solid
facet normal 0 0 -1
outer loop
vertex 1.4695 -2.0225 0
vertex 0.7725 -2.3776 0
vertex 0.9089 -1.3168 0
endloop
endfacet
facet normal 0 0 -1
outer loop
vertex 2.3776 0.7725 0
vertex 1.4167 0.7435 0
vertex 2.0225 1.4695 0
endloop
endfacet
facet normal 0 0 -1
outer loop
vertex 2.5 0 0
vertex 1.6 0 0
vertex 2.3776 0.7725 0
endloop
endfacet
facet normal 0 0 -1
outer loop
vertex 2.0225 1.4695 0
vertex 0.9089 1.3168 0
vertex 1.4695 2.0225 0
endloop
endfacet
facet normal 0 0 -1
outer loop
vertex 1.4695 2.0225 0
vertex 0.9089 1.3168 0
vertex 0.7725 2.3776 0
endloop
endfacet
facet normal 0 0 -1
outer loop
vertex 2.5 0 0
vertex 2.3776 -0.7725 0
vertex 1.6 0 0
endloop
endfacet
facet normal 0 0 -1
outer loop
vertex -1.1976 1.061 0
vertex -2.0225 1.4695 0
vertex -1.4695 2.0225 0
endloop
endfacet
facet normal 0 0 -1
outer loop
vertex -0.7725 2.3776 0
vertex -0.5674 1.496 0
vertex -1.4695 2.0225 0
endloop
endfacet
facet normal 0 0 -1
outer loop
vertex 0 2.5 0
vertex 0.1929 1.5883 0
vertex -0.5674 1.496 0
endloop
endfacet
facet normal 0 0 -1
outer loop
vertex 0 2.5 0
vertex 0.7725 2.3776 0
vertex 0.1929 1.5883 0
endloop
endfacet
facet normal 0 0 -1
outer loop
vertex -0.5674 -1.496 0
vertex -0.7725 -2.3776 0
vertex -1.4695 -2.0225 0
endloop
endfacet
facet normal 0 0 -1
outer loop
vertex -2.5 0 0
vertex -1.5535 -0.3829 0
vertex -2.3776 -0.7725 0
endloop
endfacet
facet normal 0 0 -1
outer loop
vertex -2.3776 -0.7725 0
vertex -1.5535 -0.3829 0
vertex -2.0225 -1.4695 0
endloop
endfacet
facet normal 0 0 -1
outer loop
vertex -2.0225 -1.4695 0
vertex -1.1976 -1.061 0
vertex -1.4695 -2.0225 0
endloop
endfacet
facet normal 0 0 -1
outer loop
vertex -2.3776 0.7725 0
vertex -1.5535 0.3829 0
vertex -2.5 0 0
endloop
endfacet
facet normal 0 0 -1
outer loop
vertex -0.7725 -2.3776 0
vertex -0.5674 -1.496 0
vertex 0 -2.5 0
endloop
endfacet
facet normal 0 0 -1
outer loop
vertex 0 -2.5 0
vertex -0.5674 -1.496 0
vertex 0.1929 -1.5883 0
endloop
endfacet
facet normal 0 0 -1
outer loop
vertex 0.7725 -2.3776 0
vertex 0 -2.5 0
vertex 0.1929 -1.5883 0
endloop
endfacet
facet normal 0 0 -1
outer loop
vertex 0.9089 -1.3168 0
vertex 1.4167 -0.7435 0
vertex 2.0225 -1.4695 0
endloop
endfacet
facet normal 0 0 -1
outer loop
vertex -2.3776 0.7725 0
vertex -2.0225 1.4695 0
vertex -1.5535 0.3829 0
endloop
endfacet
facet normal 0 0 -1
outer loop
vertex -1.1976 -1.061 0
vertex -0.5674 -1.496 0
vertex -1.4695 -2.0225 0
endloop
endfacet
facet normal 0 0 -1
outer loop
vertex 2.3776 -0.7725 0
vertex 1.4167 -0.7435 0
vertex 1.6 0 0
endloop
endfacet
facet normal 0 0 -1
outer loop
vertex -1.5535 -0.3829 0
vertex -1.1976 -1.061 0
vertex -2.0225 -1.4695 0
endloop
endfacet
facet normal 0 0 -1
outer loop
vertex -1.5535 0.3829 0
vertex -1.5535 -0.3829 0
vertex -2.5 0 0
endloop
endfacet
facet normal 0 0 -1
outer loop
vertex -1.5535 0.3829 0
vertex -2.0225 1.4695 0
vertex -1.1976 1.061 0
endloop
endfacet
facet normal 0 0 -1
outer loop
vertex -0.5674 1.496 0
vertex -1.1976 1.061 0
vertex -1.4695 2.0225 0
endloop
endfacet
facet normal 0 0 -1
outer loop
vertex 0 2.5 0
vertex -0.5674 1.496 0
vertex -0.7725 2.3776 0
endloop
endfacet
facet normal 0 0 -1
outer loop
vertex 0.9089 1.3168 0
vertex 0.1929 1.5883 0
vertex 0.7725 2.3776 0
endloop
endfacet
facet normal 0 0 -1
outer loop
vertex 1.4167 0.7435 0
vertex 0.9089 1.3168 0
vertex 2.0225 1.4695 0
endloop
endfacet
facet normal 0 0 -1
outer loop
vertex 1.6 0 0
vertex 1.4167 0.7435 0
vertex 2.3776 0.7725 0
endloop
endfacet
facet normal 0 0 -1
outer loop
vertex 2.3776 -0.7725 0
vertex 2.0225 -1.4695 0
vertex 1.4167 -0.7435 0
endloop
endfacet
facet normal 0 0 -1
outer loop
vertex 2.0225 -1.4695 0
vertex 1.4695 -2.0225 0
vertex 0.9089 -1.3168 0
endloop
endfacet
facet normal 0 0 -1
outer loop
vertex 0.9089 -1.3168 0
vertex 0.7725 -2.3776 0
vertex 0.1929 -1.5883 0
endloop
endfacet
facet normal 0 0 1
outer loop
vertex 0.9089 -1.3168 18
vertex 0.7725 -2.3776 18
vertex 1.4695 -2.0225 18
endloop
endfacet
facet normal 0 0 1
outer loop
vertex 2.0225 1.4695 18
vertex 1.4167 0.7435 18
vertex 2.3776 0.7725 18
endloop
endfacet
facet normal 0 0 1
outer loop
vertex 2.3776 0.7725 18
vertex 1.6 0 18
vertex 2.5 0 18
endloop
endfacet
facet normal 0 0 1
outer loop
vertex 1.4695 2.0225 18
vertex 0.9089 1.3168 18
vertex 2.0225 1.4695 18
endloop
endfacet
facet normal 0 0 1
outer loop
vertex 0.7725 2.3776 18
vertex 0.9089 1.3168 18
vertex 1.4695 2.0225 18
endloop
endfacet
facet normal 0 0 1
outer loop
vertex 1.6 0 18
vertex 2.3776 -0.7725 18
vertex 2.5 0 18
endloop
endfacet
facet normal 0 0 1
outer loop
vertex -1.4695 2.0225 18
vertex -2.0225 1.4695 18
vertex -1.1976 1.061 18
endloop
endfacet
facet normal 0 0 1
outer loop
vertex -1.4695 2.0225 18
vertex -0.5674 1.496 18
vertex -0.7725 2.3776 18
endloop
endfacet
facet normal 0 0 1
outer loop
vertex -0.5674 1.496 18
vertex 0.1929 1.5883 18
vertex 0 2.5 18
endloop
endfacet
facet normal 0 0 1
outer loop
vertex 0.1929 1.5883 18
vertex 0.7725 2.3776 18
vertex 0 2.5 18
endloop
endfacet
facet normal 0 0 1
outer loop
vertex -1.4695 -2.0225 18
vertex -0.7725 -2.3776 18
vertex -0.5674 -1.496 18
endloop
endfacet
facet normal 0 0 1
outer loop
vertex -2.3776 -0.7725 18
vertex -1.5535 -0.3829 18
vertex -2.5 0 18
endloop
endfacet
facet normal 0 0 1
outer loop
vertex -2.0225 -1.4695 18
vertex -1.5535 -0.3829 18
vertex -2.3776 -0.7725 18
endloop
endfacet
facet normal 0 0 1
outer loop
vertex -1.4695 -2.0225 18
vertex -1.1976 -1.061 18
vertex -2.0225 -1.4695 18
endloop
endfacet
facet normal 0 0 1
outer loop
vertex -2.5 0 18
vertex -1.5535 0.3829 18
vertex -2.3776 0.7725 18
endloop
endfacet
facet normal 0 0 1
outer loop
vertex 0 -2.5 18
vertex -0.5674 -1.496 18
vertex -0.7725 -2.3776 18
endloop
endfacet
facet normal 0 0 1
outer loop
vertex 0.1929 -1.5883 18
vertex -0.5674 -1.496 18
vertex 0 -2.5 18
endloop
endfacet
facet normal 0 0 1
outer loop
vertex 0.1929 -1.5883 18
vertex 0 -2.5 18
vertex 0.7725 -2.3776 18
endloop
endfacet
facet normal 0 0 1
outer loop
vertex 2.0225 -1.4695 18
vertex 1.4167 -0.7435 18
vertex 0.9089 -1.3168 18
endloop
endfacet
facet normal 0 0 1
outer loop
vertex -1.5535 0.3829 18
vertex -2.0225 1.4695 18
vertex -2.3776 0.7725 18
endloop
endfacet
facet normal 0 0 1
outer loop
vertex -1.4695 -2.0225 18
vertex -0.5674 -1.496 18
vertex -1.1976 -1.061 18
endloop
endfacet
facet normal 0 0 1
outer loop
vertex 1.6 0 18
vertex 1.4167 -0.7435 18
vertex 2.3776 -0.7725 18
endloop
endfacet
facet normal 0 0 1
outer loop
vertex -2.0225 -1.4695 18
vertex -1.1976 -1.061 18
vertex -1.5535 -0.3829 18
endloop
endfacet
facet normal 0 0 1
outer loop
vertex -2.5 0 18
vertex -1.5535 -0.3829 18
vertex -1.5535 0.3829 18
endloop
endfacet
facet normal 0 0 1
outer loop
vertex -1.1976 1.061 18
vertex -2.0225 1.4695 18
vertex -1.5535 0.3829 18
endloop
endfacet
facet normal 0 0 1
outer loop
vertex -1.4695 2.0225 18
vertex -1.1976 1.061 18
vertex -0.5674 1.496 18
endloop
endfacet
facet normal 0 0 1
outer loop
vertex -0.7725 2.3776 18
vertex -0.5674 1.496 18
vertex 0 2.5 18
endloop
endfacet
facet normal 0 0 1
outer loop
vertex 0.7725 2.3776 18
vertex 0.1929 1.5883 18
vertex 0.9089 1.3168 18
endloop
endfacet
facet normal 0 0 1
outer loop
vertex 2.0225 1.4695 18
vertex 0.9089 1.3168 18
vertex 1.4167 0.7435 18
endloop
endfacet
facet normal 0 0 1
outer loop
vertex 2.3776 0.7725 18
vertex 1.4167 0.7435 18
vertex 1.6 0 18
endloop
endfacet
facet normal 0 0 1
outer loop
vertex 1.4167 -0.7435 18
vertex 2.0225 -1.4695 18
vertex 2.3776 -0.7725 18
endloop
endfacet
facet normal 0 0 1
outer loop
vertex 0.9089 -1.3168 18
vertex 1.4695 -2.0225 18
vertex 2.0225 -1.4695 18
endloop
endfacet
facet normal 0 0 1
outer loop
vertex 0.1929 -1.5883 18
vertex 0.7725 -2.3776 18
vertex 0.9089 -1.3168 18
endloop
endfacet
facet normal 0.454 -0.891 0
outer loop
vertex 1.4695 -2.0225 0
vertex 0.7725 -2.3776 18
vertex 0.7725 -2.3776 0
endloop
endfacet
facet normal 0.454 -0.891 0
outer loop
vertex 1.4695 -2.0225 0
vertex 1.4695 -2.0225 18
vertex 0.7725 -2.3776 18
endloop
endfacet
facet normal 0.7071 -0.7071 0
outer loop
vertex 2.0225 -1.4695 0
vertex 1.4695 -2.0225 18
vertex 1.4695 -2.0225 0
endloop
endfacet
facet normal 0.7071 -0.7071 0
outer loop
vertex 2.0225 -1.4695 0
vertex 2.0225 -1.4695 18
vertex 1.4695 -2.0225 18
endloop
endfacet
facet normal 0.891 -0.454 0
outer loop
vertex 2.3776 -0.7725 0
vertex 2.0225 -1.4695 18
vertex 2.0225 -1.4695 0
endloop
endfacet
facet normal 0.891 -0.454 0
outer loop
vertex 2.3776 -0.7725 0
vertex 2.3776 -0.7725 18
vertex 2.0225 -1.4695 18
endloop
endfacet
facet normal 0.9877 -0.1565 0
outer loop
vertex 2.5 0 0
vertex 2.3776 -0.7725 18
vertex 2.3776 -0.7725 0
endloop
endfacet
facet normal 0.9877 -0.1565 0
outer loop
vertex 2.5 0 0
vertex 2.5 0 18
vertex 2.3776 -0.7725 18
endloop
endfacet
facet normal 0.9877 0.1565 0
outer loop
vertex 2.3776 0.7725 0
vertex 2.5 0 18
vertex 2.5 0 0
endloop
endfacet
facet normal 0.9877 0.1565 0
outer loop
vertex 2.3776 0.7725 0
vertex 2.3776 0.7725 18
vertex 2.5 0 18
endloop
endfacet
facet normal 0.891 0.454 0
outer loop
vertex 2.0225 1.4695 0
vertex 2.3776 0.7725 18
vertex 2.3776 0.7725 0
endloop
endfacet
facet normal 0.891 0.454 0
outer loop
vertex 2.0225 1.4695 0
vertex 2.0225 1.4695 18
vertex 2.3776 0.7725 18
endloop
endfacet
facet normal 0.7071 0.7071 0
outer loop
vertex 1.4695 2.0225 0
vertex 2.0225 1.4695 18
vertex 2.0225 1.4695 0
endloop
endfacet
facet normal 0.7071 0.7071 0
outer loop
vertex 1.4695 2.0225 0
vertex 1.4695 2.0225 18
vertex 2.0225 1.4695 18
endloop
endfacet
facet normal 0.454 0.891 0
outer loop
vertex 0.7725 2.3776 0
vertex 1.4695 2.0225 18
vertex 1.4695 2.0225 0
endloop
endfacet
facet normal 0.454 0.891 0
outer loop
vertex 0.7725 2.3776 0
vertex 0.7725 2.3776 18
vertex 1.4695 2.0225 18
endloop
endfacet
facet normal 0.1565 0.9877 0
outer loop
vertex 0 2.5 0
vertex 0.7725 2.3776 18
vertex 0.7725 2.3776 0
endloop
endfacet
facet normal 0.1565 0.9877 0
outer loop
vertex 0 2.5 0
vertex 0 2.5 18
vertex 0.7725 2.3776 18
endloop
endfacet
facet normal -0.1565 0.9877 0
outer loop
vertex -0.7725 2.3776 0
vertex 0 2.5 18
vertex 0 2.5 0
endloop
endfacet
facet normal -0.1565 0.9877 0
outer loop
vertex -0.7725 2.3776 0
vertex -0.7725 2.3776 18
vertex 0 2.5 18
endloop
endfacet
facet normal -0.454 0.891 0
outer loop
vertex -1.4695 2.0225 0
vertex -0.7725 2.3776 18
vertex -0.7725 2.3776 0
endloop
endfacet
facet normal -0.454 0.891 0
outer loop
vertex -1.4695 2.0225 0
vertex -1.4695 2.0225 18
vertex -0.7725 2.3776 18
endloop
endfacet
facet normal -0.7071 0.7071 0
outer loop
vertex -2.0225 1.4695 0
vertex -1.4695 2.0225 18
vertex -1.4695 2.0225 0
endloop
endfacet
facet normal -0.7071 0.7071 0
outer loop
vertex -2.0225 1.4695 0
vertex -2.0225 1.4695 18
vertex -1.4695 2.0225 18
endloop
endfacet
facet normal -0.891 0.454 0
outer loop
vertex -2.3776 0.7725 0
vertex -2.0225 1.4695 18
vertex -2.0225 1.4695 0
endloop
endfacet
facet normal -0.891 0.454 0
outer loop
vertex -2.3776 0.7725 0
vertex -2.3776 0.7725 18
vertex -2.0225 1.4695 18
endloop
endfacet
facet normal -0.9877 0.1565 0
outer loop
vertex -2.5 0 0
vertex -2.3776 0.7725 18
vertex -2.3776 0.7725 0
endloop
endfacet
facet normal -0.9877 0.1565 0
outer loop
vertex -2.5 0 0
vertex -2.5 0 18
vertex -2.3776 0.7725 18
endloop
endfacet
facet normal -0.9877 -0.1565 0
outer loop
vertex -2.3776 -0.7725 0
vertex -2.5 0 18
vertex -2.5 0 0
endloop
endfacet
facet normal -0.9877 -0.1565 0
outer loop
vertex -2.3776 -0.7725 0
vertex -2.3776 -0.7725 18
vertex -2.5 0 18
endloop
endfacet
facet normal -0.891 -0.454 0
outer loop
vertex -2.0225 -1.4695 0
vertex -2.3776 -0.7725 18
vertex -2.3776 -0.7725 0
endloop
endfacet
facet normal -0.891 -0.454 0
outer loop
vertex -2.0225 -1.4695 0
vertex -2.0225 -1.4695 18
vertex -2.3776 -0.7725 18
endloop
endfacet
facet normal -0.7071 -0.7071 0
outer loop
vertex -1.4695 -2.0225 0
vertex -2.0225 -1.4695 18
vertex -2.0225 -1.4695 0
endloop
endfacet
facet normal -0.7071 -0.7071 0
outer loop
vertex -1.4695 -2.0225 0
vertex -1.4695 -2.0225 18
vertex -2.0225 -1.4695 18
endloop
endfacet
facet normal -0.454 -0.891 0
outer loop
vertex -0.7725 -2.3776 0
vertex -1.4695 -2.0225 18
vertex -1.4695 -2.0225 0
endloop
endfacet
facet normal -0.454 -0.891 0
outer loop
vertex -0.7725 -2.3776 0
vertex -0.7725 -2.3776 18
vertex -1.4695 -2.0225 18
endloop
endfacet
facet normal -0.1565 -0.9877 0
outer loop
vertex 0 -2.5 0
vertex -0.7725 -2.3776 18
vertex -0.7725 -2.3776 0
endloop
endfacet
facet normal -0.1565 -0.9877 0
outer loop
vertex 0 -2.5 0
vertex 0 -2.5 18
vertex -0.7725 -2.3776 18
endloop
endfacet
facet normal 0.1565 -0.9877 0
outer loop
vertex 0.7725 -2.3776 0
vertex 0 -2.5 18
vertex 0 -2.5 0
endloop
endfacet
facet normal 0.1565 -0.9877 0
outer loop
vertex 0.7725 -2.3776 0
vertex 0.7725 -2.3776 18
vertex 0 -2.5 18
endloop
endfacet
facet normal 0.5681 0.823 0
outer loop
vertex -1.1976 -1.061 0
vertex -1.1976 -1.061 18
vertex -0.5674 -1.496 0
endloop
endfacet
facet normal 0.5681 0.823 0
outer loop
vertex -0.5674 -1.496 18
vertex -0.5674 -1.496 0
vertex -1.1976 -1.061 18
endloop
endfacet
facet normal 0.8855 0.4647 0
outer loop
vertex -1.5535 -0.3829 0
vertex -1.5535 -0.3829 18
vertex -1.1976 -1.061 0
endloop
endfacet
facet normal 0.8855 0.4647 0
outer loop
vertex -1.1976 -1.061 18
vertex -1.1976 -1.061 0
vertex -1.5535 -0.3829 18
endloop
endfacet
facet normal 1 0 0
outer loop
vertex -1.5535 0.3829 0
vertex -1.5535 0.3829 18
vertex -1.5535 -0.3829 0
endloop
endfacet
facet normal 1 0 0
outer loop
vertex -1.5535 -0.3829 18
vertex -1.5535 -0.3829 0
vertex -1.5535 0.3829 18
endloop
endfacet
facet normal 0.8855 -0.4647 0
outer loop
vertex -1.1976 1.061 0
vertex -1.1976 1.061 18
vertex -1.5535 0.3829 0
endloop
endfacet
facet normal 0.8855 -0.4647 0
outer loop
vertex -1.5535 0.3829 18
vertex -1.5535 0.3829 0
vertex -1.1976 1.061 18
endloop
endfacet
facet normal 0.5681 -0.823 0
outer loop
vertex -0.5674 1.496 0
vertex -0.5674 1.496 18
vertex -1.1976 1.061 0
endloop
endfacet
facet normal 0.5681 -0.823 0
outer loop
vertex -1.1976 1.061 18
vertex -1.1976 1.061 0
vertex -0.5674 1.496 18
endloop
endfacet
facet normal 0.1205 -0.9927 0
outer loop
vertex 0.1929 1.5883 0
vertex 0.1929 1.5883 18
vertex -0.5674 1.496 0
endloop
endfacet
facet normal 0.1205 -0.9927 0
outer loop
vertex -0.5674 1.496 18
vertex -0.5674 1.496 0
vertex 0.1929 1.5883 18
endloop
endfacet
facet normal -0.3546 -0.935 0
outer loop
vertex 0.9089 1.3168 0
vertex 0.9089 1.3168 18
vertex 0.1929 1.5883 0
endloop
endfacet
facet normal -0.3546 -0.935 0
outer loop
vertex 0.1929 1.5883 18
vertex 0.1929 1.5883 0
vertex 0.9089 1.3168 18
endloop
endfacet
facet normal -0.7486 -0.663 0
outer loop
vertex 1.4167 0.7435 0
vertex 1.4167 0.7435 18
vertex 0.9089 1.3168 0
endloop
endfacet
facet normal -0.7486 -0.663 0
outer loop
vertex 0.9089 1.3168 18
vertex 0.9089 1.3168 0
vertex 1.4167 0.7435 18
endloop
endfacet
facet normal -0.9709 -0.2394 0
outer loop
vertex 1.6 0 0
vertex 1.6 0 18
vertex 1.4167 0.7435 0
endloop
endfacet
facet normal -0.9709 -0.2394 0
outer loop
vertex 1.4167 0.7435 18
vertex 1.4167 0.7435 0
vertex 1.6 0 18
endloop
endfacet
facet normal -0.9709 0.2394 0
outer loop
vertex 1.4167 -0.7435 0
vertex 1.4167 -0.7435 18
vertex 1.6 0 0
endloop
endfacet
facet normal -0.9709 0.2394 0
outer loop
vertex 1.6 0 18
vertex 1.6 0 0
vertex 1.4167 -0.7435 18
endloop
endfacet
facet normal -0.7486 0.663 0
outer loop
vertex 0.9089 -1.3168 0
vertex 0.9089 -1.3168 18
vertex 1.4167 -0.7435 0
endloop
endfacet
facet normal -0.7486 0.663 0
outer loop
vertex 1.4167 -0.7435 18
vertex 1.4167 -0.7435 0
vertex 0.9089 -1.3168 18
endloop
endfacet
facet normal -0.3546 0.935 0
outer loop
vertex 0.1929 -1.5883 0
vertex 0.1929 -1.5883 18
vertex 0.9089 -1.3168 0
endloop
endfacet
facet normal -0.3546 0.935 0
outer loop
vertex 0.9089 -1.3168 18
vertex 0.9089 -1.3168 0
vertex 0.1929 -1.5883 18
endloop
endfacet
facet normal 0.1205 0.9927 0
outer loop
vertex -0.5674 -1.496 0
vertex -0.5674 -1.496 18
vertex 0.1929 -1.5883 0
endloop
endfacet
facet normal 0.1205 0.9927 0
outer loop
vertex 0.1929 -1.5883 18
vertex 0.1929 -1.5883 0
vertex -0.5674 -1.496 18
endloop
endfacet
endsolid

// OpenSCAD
$fs = 0.8;

cyDiam = 3.2;
cyHeight = 18;

linear_extrude(height = cyHeight) 
difference() {
	circle(r = cyDiam/2 + 0.9);
	circle(r = cyDiam/2);
}
